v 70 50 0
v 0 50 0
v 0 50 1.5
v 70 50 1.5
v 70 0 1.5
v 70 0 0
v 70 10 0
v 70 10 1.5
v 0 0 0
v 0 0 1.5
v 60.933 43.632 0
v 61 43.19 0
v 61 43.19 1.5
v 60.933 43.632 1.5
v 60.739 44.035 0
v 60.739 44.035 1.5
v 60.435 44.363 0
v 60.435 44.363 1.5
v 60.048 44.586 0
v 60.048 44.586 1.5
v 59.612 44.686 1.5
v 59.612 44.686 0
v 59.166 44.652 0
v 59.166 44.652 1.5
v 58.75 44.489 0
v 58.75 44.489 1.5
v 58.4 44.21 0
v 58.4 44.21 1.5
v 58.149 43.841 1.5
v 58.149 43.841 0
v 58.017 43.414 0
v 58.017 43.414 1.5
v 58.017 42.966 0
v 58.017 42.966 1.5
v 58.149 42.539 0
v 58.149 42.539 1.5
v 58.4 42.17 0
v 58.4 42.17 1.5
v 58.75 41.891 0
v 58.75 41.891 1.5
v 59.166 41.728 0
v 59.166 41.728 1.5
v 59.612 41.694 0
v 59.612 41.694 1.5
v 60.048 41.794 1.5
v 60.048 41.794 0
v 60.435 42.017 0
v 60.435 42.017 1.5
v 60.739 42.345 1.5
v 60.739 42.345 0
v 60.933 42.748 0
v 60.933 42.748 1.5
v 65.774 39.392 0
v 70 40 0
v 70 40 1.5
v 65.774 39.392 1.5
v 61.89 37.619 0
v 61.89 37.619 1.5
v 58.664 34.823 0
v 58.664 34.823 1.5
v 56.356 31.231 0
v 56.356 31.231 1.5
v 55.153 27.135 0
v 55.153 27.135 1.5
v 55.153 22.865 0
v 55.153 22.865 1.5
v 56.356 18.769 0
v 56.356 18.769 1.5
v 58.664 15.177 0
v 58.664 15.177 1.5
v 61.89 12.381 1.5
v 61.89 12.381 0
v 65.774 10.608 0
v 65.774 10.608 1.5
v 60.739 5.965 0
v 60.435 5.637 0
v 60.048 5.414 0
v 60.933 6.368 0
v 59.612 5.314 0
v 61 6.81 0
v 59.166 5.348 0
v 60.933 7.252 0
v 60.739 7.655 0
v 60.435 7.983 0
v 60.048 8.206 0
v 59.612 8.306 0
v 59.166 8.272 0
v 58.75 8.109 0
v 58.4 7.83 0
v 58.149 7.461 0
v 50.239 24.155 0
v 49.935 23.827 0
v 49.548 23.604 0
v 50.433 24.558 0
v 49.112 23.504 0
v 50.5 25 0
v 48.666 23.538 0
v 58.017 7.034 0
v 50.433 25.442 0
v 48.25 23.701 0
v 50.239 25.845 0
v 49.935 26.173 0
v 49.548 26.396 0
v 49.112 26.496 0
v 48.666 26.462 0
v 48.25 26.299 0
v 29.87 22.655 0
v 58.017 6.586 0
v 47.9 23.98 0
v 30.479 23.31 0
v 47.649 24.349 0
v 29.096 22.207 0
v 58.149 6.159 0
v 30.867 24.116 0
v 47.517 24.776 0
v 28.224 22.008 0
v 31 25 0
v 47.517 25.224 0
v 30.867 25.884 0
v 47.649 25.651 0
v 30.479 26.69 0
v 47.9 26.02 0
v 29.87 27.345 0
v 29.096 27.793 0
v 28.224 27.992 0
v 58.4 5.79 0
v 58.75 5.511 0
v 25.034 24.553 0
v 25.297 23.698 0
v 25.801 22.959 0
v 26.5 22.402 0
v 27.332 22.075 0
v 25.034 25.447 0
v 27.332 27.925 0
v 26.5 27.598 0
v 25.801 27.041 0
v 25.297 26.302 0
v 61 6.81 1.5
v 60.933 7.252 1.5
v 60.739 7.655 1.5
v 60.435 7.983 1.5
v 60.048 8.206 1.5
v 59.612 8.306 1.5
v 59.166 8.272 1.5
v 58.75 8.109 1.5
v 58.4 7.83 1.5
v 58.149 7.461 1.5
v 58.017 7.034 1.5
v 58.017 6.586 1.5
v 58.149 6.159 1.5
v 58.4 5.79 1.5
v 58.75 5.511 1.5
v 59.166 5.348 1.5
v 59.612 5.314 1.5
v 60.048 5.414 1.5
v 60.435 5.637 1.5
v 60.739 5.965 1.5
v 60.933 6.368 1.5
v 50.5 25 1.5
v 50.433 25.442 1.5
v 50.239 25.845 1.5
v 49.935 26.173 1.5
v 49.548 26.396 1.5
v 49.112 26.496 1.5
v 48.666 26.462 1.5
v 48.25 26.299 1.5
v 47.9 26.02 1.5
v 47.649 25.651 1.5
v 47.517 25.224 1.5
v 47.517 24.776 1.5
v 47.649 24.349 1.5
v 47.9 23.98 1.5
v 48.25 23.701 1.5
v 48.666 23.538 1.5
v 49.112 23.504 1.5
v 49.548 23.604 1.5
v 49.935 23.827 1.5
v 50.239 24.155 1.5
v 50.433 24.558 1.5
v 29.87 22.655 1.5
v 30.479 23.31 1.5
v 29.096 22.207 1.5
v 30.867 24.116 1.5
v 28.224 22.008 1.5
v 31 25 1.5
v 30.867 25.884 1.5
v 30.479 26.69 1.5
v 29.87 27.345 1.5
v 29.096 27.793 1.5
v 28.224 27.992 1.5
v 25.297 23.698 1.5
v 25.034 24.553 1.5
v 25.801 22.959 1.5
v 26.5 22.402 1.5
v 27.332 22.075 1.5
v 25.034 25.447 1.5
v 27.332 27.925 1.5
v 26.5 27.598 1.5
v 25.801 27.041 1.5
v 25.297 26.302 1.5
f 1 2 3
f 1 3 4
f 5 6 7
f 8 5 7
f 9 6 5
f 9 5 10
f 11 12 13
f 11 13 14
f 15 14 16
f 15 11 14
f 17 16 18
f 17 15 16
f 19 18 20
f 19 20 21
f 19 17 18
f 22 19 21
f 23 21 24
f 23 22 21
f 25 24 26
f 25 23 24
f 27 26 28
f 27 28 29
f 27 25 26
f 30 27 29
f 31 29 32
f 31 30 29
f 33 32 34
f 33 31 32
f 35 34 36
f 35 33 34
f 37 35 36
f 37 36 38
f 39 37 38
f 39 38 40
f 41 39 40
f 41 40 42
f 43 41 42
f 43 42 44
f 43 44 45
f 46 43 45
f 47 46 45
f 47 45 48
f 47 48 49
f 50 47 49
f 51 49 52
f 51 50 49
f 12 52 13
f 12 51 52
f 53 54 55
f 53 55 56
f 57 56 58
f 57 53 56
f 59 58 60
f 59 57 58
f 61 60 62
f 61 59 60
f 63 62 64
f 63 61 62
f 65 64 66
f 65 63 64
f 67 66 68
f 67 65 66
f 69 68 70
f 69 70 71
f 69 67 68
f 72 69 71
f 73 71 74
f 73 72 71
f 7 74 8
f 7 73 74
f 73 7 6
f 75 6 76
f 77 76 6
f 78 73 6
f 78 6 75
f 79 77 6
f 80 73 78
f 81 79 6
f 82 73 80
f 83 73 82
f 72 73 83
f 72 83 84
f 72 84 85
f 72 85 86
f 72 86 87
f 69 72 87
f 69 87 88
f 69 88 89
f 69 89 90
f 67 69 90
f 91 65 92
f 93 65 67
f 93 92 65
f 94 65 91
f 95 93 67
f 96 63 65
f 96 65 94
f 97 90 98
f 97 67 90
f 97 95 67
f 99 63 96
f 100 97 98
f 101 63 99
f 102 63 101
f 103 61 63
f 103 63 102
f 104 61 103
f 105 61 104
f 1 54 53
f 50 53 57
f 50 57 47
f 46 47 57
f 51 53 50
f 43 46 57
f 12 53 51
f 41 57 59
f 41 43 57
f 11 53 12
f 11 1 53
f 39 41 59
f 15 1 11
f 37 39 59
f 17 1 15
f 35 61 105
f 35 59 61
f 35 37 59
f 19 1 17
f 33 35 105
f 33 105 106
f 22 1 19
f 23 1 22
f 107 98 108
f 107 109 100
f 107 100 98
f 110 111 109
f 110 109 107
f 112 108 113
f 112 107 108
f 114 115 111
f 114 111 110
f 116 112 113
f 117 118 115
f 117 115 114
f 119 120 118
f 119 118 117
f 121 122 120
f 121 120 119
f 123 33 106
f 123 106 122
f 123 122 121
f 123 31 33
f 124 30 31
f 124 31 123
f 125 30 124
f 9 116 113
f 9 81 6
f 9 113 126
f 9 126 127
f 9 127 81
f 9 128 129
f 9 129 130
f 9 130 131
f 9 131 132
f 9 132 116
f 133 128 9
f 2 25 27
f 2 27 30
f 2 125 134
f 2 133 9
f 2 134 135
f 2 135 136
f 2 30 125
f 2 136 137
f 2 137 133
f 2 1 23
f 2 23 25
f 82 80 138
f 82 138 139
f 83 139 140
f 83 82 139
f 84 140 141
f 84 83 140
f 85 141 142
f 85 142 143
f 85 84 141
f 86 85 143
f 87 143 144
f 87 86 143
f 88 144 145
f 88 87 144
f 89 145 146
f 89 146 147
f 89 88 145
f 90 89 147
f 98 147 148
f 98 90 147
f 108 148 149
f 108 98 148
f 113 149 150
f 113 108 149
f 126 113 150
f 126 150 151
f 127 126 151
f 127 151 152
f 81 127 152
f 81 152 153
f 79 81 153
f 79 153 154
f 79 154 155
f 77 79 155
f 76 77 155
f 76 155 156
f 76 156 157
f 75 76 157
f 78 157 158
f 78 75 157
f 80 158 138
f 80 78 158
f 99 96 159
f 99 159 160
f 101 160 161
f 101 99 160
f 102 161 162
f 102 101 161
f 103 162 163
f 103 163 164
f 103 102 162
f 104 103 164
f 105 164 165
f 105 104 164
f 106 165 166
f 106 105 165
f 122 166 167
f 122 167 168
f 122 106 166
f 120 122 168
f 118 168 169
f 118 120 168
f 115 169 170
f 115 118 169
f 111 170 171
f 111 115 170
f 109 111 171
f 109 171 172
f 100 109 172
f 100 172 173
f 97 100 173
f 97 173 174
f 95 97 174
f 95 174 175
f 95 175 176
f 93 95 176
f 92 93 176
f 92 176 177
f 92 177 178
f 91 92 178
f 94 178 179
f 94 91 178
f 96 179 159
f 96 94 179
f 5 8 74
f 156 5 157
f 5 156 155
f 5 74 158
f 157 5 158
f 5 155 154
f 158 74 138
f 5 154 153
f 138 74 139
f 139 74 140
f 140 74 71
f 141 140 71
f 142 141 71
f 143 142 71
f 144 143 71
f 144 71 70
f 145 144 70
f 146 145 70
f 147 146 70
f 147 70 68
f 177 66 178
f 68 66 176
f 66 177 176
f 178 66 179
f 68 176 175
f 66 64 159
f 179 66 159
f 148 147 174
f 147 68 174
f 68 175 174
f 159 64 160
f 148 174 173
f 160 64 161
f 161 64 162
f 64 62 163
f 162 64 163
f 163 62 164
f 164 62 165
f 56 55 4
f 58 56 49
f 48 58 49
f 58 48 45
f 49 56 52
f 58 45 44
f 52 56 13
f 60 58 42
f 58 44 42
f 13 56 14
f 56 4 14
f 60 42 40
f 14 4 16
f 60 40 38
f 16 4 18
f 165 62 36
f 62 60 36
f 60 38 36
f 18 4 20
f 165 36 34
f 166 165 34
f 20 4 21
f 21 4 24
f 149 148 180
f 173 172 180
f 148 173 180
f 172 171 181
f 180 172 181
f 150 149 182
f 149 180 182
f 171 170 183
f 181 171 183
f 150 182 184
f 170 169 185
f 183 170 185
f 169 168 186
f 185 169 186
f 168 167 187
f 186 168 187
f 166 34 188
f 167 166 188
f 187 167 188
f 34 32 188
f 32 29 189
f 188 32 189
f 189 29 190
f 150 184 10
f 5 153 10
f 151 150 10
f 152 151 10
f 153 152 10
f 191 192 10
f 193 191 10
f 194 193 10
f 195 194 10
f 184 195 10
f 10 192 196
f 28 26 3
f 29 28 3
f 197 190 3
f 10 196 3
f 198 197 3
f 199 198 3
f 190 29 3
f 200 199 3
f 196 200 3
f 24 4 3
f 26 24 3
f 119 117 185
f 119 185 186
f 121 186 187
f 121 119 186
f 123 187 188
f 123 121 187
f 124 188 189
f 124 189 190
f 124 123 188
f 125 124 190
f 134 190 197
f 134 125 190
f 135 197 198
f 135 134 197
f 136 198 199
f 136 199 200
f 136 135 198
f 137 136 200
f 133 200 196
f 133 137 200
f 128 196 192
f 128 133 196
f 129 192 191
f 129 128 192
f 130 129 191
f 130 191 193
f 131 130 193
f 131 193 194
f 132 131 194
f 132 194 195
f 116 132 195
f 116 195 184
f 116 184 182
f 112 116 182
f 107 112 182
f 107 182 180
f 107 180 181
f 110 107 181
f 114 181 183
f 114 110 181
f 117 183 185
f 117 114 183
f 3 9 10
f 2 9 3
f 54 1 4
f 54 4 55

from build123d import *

# Parameters (mm, degrees)
SKETCH_R   = 3
SKETCH_R_2 = 1.5
PAD_DEPTH  = 1.5


with BuildPart() as part:
    # Sketch → Pad (new body)
    with BuildSketch(Plane.XY):
        with BuildLine():
            Line((70, 0), (0, 0))
            Line((0, 0), (0, 50))
            Line((0, 50), (70, 50))
            Line((70, 50), (70, 40))
            ThreePointArc((70, 40), (55, 25), (70, 10))
            Line((70, 0), (70, 10))
        make_face()
        with Locations((28, 25)):
            Circle(SKETCH_R, mode=Mode.SUBTRACT)
        with Locations((49, 25)):
            Circle(SKETCH_R_2, mode=Mode.SUBTRACT)
        with Locations((59.5, 43.19)):
            Circle(SKETCH_R_2, mode=Mode.SUBTRACT)
        with Locations((59.5, 6.81)):
            Circle(SKETCH_R_2, mode=Mode.SUBTRACT)
    extrude(amount=PAD_DEPTH)


solid = part.part
